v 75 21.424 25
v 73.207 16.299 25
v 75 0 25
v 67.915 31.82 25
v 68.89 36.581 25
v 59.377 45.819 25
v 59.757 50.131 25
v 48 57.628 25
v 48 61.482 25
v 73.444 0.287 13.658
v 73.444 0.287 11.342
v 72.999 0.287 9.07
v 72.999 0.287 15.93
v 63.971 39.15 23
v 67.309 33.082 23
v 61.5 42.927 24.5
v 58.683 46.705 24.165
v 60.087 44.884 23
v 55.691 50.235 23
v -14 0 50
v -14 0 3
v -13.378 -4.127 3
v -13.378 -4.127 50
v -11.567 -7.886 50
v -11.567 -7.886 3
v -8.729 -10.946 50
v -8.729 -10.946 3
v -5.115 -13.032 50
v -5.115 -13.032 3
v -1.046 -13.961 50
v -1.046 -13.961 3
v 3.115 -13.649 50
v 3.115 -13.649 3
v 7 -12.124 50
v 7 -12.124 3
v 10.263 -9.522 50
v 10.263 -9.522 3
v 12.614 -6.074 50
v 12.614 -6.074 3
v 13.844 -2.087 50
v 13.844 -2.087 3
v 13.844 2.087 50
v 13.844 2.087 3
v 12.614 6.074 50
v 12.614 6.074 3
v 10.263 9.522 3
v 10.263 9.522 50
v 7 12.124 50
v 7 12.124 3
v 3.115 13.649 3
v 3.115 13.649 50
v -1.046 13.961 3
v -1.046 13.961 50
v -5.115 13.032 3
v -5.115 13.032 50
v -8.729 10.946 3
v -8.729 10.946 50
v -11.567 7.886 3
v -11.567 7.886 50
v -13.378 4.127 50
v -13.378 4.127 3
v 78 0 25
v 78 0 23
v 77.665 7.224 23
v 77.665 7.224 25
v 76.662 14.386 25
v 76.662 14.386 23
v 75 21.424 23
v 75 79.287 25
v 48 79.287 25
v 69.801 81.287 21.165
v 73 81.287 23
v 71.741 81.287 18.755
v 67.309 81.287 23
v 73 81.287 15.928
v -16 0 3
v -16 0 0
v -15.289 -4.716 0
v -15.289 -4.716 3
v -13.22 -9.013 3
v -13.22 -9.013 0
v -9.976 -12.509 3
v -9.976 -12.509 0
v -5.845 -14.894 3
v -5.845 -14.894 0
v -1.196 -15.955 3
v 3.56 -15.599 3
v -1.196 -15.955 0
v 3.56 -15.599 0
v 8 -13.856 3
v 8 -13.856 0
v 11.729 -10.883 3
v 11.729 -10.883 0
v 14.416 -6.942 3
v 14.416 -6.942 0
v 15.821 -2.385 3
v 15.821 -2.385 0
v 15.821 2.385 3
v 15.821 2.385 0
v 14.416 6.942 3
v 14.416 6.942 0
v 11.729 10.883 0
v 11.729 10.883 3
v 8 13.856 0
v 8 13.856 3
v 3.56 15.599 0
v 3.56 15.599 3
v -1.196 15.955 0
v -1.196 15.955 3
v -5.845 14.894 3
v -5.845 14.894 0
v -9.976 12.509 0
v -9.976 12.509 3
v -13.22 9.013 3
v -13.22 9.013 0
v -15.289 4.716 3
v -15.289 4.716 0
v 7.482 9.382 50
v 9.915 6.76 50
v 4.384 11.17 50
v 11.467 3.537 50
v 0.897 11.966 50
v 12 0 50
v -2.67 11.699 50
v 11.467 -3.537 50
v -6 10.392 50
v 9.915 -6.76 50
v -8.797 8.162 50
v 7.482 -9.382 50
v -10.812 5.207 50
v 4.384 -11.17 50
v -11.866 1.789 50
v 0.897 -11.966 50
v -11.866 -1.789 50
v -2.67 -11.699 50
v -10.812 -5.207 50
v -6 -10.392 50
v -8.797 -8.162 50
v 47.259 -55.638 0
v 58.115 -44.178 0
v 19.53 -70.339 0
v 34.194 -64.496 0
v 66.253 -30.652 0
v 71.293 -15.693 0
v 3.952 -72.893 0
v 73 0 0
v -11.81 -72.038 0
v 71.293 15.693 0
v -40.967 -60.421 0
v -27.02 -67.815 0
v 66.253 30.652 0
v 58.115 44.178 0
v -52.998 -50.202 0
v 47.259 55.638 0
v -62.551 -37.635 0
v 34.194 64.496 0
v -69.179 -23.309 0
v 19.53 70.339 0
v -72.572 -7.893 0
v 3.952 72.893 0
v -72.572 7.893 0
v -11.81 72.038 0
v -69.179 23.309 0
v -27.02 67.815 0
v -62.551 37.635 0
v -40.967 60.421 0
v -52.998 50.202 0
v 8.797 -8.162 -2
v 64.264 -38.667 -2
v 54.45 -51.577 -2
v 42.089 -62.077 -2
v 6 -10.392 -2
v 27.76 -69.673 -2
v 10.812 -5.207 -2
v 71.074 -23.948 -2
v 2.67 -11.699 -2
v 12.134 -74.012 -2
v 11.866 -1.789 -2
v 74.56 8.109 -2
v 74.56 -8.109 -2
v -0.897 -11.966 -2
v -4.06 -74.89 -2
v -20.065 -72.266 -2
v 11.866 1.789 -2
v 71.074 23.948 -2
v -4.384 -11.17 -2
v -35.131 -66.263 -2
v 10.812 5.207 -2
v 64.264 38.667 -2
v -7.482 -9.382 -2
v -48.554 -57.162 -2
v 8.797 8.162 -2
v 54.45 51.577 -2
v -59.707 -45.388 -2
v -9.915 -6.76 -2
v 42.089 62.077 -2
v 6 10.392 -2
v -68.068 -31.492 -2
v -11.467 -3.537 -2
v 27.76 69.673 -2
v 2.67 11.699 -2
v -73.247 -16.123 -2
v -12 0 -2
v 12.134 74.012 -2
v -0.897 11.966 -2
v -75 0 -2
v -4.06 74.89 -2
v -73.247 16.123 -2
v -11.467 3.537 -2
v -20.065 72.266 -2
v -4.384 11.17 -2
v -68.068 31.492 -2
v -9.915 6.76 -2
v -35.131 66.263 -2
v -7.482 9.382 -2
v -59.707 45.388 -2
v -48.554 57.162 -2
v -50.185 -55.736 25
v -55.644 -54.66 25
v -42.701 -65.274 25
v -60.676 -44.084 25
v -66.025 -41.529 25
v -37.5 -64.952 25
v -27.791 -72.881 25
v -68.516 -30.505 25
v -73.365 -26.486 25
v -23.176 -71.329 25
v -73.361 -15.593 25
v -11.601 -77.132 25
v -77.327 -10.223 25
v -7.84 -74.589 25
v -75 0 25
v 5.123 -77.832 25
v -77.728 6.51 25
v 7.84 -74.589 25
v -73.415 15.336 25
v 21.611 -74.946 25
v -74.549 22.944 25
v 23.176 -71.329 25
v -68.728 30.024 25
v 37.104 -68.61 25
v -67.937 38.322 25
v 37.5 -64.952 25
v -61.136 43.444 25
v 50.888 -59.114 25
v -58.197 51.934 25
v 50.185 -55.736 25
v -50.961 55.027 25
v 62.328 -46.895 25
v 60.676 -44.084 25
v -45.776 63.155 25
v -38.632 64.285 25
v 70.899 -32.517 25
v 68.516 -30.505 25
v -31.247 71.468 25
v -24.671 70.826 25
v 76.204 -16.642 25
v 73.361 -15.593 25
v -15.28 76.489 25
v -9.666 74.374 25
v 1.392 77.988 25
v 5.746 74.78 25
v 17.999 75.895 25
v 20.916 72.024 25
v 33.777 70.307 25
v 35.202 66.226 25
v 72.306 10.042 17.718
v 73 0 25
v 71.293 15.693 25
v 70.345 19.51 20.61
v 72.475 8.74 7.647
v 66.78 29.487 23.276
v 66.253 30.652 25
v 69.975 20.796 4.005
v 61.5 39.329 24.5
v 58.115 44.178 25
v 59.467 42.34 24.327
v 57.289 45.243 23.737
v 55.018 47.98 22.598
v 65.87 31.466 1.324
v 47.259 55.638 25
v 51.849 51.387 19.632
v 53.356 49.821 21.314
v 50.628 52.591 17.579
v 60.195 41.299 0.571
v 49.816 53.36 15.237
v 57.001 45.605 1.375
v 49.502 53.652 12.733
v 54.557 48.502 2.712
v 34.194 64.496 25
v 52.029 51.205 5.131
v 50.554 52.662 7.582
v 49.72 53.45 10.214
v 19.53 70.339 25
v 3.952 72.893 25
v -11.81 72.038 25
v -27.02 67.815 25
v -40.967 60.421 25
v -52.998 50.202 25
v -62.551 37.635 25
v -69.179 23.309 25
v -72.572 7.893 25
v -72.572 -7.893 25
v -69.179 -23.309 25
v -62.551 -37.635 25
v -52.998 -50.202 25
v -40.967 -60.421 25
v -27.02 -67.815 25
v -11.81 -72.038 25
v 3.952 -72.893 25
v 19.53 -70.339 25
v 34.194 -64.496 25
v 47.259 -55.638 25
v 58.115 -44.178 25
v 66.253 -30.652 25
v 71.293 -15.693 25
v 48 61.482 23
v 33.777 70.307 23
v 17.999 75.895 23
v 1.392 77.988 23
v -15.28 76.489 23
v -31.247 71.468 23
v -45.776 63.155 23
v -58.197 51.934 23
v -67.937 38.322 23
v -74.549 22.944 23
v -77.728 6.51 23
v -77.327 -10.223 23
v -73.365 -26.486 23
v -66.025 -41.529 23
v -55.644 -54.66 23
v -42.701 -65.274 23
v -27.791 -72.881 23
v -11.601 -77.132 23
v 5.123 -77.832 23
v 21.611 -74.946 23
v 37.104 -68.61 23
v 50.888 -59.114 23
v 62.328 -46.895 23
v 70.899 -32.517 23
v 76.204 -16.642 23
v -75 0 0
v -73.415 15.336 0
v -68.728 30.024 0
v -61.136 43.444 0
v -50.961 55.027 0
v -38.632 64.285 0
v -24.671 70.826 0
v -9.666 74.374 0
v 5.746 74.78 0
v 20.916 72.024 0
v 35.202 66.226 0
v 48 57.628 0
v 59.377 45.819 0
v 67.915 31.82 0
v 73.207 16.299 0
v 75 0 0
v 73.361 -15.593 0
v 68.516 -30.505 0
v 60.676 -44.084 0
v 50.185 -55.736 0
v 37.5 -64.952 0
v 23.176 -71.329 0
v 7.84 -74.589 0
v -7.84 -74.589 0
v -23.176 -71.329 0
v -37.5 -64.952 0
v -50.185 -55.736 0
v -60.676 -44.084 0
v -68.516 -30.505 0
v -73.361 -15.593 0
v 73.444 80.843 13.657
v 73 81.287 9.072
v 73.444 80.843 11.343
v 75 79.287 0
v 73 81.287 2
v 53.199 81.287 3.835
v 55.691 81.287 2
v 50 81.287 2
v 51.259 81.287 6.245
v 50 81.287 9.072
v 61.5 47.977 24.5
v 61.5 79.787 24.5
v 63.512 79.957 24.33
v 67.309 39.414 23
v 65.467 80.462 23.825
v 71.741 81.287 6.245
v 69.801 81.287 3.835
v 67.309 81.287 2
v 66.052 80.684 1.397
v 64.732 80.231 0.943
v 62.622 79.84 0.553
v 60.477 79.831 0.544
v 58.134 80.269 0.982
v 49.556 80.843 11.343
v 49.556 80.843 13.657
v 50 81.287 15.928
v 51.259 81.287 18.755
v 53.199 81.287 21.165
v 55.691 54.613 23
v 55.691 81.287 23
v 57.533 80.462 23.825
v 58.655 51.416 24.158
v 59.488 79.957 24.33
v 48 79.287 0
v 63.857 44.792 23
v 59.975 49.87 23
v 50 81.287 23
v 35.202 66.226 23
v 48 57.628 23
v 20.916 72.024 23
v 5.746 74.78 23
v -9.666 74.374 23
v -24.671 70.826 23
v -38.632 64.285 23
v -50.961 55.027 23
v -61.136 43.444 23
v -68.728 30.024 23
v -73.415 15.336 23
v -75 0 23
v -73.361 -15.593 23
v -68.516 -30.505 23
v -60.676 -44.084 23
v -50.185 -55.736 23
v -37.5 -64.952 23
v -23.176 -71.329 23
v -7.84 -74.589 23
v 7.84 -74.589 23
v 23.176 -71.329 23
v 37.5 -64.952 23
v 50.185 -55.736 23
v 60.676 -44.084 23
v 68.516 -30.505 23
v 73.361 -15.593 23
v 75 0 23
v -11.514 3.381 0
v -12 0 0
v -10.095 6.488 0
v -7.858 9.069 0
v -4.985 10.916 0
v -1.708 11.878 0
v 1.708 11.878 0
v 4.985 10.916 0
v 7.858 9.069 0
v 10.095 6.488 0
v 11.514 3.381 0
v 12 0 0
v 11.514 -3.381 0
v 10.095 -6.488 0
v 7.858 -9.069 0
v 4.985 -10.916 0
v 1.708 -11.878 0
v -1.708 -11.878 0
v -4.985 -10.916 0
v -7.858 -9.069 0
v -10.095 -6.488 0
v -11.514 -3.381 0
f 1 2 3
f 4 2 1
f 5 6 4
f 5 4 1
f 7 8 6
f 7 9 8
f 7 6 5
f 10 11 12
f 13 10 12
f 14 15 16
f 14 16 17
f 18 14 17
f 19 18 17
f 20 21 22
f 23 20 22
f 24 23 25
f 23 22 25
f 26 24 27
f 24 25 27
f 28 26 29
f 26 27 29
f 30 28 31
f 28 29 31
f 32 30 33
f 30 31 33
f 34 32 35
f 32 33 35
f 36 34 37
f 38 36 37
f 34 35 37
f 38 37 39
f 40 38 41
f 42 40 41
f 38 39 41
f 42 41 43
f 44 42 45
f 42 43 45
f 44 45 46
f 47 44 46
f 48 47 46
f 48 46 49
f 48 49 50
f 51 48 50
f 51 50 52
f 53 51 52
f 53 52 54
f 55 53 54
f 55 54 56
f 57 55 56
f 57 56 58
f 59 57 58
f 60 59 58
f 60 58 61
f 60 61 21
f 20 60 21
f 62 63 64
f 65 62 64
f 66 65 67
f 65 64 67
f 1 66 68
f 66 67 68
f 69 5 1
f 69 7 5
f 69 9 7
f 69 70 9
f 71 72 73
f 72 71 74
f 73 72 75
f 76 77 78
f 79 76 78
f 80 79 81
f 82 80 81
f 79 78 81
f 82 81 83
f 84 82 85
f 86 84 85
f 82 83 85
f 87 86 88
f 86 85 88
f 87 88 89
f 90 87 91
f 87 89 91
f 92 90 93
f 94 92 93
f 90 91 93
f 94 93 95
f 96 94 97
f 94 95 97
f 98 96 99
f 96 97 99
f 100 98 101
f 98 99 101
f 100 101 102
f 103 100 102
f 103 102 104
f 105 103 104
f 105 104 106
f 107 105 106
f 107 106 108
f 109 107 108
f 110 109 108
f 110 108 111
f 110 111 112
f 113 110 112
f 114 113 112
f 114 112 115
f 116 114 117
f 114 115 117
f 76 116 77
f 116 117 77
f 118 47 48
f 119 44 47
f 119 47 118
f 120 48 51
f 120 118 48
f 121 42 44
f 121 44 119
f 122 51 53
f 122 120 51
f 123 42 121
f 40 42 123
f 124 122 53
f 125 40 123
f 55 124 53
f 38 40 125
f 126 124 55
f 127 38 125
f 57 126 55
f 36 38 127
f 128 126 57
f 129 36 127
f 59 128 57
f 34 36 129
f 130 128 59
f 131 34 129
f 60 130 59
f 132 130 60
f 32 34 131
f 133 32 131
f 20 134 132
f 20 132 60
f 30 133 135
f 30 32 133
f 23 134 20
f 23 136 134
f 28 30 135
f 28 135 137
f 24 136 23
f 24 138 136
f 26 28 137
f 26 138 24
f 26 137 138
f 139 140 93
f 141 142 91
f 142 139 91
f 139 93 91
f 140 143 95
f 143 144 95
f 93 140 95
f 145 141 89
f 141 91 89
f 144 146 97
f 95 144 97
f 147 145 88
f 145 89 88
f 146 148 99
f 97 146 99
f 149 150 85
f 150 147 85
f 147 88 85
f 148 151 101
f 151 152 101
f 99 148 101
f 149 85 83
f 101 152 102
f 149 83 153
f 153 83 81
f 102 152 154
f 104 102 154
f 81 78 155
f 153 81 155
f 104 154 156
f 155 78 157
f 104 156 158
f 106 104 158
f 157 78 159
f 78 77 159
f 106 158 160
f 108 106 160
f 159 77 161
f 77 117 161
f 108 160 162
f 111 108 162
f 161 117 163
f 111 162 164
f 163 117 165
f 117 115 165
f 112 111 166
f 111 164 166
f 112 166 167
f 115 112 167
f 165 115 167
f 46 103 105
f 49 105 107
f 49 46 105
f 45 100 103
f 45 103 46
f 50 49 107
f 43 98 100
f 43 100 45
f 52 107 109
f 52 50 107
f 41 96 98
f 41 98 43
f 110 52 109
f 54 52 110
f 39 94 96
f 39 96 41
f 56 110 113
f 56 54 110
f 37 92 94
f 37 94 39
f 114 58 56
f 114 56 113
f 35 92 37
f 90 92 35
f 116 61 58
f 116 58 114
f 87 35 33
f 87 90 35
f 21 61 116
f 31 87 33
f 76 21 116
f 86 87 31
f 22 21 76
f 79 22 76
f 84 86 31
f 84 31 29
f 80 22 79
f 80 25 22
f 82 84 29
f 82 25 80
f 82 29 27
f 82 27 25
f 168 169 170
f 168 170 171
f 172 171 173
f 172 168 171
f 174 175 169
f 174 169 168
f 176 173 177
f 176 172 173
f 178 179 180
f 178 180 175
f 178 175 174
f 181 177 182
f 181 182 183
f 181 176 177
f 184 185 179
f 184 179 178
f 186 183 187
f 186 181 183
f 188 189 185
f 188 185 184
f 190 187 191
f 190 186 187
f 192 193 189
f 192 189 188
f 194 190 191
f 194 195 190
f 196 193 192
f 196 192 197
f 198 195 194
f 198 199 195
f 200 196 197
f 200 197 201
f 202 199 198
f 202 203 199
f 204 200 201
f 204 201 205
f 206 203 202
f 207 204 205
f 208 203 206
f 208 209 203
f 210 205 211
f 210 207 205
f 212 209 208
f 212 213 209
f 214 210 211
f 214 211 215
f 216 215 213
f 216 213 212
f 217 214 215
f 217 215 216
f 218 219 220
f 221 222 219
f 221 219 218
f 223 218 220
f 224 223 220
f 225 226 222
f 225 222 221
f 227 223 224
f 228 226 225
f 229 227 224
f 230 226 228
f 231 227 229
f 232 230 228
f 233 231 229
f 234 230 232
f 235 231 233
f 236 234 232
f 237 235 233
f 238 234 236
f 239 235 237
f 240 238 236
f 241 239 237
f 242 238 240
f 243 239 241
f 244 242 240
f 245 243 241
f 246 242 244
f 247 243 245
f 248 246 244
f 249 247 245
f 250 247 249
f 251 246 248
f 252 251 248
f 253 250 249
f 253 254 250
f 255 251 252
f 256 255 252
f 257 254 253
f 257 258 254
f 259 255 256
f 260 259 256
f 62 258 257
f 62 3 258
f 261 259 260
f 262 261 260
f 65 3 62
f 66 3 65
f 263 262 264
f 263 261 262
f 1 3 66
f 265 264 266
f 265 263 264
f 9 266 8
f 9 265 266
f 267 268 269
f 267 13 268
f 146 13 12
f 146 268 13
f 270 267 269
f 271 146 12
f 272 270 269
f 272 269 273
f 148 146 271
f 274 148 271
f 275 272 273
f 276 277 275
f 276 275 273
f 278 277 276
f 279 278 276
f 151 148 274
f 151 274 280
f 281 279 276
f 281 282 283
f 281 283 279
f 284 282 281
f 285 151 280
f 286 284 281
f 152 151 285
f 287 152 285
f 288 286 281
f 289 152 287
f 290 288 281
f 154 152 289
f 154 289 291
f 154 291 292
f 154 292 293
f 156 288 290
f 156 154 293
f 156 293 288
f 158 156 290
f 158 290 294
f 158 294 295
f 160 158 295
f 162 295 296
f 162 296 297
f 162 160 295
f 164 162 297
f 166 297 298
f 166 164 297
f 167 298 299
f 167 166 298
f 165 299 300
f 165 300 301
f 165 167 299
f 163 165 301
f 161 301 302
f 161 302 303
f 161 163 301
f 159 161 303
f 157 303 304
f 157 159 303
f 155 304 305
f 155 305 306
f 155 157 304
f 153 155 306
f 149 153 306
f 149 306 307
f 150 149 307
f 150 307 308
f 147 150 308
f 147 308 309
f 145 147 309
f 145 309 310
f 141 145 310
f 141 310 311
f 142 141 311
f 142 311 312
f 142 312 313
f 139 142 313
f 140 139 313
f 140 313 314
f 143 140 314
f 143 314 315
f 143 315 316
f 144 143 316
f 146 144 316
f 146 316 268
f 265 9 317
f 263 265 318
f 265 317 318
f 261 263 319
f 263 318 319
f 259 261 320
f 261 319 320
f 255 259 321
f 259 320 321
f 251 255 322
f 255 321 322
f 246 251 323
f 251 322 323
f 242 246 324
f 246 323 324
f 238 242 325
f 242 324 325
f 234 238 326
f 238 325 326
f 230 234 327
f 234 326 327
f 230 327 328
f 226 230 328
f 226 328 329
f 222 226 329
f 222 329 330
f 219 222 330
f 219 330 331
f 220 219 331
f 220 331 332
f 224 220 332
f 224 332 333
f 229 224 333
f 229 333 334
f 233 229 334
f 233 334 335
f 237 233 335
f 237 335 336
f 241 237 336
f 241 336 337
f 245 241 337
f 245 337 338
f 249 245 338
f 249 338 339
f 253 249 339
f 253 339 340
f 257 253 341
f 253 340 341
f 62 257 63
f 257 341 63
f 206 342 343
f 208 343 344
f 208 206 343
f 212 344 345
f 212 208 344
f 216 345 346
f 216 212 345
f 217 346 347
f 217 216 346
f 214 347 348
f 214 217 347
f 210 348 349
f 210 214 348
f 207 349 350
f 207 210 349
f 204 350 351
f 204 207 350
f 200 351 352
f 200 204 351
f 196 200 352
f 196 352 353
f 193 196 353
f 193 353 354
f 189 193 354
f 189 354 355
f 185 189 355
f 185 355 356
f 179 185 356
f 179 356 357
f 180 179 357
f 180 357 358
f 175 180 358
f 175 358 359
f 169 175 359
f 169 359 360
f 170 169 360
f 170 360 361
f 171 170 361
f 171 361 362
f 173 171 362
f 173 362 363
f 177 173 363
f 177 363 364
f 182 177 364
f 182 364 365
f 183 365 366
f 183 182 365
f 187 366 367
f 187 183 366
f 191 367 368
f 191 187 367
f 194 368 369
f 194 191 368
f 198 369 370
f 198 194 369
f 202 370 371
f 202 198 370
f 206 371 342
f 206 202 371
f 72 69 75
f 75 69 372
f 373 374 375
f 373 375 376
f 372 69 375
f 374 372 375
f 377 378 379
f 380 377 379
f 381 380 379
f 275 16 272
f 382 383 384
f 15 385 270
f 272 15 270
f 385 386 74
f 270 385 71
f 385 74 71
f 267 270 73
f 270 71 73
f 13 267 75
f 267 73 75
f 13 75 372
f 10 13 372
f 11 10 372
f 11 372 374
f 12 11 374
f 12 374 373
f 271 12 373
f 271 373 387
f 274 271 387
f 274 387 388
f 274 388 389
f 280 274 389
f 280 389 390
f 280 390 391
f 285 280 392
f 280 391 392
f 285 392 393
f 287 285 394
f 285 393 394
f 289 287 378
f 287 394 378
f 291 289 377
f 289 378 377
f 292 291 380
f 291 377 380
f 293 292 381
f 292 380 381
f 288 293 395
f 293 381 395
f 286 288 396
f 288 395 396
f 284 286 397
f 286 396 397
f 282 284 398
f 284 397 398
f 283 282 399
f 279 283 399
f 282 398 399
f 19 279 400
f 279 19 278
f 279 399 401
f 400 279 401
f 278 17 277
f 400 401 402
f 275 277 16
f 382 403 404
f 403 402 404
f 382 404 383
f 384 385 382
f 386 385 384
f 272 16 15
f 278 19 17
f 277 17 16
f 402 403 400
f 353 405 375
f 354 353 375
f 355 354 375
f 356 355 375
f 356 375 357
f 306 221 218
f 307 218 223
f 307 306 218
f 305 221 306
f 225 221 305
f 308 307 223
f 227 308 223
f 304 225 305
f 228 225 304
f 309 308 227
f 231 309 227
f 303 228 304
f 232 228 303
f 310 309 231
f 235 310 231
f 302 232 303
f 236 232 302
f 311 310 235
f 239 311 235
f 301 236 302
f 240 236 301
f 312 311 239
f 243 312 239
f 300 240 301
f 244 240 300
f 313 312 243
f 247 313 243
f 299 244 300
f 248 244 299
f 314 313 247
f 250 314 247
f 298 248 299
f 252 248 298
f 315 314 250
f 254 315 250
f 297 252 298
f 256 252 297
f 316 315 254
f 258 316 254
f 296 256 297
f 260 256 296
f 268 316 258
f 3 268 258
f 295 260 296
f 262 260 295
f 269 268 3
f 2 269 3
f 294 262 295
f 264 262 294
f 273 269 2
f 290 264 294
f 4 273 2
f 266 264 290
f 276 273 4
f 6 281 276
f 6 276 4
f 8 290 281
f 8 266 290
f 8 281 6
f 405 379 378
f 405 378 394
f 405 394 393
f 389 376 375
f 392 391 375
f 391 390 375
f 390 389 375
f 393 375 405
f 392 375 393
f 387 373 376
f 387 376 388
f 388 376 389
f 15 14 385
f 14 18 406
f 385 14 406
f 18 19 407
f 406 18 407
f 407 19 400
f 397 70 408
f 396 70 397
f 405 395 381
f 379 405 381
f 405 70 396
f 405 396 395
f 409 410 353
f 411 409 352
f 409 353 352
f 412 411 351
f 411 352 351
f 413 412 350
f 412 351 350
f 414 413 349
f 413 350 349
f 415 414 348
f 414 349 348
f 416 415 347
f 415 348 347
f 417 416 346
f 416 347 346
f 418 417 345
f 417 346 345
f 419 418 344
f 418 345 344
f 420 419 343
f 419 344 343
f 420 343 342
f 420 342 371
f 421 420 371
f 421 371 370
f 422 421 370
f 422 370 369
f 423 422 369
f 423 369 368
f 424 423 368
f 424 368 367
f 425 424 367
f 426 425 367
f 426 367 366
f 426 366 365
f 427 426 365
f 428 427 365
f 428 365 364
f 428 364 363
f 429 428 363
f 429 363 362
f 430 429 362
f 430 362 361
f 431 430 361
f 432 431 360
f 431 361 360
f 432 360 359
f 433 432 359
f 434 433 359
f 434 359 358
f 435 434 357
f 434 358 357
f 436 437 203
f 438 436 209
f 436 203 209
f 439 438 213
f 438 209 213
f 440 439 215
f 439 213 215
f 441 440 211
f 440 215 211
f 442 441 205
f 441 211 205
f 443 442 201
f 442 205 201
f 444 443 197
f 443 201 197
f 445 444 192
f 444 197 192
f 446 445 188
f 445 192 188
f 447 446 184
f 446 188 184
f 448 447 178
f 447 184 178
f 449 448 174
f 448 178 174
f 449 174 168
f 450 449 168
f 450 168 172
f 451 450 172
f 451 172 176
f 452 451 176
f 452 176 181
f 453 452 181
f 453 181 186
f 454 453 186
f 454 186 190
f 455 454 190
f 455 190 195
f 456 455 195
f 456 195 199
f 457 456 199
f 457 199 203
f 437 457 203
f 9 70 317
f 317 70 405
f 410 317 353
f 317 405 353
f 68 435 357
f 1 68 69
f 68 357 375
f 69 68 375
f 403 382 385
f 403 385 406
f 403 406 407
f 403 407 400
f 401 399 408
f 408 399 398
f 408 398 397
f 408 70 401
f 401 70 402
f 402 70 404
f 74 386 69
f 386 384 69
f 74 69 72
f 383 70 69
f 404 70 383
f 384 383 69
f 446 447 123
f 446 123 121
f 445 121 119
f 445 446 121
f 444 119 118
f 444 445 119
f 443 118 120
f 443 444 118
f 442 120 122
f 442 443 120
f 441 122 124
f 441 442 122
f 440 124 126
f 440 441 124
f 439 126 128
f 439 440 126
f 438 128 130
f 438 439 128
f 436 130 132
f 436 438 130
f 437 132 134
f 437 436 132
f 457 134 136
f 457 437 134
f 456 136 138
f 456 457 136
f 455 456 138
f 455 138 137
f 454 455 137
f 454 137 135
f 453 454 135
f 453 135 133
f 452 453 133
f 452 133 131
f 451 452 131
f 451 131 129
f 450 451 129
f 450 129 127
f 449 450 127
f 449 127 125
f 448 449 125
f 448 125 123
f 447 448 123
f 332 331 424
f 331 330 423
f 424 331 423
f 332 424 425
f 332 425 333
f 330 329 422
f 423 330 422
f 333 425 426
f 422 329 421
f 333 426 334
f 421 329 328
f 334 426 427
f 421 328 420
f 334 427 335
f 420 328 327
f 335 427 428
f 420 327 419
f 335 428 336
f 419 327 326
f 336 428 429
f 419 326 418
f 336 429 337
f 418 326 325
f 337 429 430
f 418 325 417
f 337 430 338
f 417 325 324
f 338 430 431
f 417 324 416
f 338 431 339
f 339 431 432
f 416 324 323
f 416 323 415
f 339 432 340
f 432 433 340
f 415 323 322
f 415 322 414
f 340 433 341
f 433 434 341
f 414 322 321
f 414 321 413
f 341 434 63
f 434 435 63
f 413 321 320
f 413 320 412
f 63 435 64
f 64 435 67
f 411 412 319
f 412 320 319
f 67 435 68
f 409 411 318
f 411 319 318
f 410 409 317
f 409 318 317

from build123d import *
from build123d.topology import SkipClean

# Parameters (mm, degrees)
SKETCH1_R           = 75
SKETCH1_R_2         = 73
BOSS_EXTRUDE1_DEPTH = 25
BOSS_EXTRUDE2_START = -25
BOSS_EXTRUDE2_DEPTH = 25
SKETCH4_R           = 12
CUT_EXTRUDE2_DEPTH  = 81
BOSS_EXTRUDE3_START = 2
SKETCH5_R           = 75
SKETCH5_R_2         = 12
BOSS_EXTRUDE3_DEPTH = 2
CHAMFER1_SIZE       = 2
SKETCH6_R           = 14
SKETCH6_R_2         = 12
BOSS_EXTRUDE4_DEPTH = 50
SKETCH7_R           = 16
SKETCH7_R_2         = 14
BOSS_EXTRUDE5_DEPTH = 3
BOSS_EXTRUDE6_START = -2
SKETCH8_R           = 78
SKETCH8_R_2         = 75
BOSS_EXTRUDE6_DEPTH = 2


with BuildPart() as part:
    # Sketch1 → Boss-Extrude1 (new body)
    with BuildSketch(Plane.XY):
        Circle(SKETCH1_R)
        Circle(SKETCH1_R_2, mode=Mode.SUBTRACT)
    extrude(amount=BOSS_EXTRUDE1_DEPTH)

    # Sketch2 → Boss-Extrude2 (add)
    with BuildSketch(Plane.XY.offset(25).offset(BOSS_EXTRUDE2_START)):
        with BuildLine():
            Line((75, 81.287132565), (48, 81.287132565))
            Line((48, 81.287132565), (48, 57.628118137))
            ThreePointArc((48, 57.628118137), (67.915388536, 31.819805153), (75, 0))
            Line((75, 0), (75, 81.287132565))
        make_face()
    extrude(amount=BOSS_EXTRUDE2_DEPTH)

    # Sketch4 → Cut-Extrude2 (cut)
    with BuildSketch(Plane(origin=(0, 81.287132565, 0), x_dir=(1, 0, 0), z_dir=(0, 1, 0))):
        with Locations(Location((61.5, -12.5, 0), (0, 0, 270))):
            Circle(SKETCH4_R)
    extrude(amount=-CUT_EXTRUDE2_DEPTH, mode=Mode.SUBTRACT)

    # Sketch5 → Boss-Extrude3 (add)
    with BuildSketch(Plane(origin=(0, 0, 0), x_dir=(-1, 0, 0), z_dir=(0, 0, -1)).offset(BOSS_EXTRUDE3_START)):
        Circle(SKETCH5_R)
        Circle(SKETCH5_R_2, mode=Mode.SUBTRACT)
    extrude(amount=-BOSS_EXTRUDE3_DEPTH)

    # Chamfer1
    # the kernel refuses this chamfer: 2 mm, written as the material it takes off along each edge
    with BuildSketch(Plane(origin=(75, 81.287132565, -5.143365976), x_dir=(0.027495876610589005, -0.9996219169112968, 0), z_dir=(0, 0, 1))) as chamfer1_piece_1:
        Polygon((CHAMFER1_SIZE * 0.999621916911, -CHAMFER1_SIZE * 0.0274958766106), (-CHAMFER1_SIZE * 0.0274958766106, -CHAMFER1_SIZE * 0.999621916911), (0, 0), align=None)
    extrude(amount=35.286731952, mode=Mode.SUBTRACT)
    with BuildSketch(Plane(origin=(48, 81.287132565, -5.143365976), x_dir=(-0.02749587661058555, -0.9996219169112968, 0), z_dir=(0, 0, 1))) as chamfer1_piece_2:
        Polygon((CHAMFER1_SIZE * 0.999621916911, CHAMFER1_SIZE * 0.0274958766106), (-CHAMFER1_SIZE * 0.0274958766106, CHAMFER1_SIZE * 0.999621916911), (0, 0), align=None)
    extrude(amount=35.286731952, mode=Mode.SUBTRACT)
    with BuildSketch(Plane(origin=(80.143365976, 81.287132565, 25), x_dir=(0, -0.9996219169112968, 0.02749587661058555), z_dir=(-1, 0, 0)), Plane(origin=(80.143365976, 81.287132565, 0), x_dir=(0, 0.02749587661058908, 0.9996219169112968), z_dir=(-1, 0, 0))) as chamfer1_piece_3:
        Polygon((CHAMFER1_SIZE * 0.999621916911, -CHAMFER1_SIZE * 0.0274958766106), (-CHAMFER1_SIZE * 0.0274958766106, -CHAMFER1_SIZE * 0.999621916911), (0, 0), align=None)
    extrude(amount=37.286731952, mode=Mode.SUBTRACT)

    # Sketch6 → Boss-Extrude4 (add)
    with SkipClean():  # the faces are left unmerged after this step: merging them gives an invalid solid
        with BuildSketch(Plane.XY):
            with Locations(Location((0, 0, 0), (0, 0, 180))):
                Circle(SKETCH6_R)
            Circle(SKETCH6_R_2, mode=Mode.SUBTRACT)
        extrude(amount=BOSS_EXTRUDE4_DEPTH)
    add(part.part.scale(1), mode=Mode.REPLACE)  # the faces are merged on a copy

    # Sketch7 → Boss-Extrude5 (add)
    with BuildSketch(Plane.XY):
        with Locations(Location((0, 0, 0), (0, 0, 180))):
            Circle(SKETCH7_R)
        Circle(SKETCH7_R_2, mode=Mode.SUBTRACT)
    extrude(amount=BOSS_EXTRUDE5_DEPTH)

    # Sketch8 → Boss-Extrude6 (add)
    with SkipClean():  # the faces are left unmerged after this step: merging them gives an invalid solid
        with BuildSketch(Plane.XY.offset(25).offset(BOSS_EXTRUDE6_START)):
            Circle(SKETCH8_R)
            with Locations(Location((0, 0, 0), (0, 0, 180))):
                Circle(SKETCH8_R_2, mode=Mode.SUBTRACT)
        extrude(amount=BOSS_EXTRUDE6_DEPTH)


solid = part.part
